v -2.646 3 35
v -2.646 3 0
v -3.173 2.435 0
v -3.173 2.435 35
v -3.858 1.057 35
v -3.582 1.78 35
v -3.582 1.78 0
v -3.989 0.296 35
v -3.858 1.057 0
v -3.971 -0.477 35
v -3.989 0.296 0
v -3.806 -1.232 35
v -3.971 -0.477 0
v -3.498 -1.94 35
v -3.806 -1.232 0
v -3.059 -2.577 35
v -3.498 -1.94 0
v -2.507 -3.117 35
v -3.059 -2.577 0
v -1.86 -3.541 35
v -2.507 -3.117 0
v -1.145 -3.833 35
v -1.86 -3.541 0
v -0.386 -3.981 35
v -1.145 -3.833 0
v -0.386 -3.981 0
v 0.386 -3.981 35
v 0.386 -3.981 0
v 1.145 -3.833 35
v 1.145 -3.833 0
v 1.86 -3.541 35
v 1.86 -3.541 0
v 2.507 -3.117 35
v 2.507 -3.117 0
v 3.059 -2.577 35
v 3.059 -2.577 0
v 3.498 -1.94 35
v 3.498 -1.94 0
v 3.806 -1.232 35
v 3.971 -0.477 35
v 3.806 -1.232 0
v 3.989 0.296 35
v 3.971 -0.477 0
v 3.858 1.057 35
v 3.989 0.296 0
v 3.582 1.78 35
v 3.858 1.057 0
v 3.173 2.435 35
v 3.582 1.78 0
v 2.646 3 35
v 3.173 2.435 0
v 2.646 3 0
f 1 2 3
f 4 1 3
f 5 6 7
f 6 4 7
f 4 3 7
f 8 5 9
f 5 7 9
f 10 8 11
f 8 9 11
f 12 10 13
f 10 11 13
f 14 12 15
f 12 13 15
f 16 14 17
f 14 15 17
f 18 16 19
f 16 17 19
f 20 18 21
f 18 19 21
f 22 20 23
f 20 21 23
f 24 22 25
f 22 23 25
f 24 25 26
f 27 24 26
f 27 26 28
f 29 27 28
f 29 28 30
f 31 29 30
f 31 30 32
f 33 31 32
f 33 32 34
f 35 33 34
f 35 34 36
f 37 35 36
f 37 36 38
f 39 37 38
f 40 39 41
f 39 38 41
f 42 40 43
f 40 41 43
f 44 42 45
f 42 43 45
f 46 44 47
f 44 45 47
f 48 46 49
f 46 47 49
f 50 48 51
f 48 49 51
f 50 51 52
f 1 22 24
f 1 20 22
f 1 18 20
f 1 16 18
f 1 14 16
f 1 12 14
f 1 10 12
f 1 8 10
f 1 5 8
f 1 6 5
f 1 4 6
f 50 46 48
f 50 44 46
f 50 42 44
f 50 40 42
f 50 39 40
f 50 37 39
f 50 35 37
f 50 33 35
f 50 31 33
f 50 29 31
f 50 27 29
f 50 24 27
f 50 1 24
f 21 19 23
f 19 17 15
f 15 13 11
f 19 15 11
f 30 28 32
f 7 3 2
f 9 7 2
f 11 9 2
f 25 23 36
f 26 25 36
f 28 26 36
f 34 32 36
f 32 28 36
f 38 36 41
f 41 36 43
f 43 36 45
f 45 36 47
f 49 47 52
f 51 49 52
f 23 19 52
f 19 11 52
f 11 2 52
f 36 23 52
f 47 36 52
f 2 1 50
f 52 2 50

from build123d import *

# Parameters (mm, degrees)
SKETCH2_R                      = 4
BOSS_EXTRUDE1_DEPTH            = 35
CUT_EXTRUDE1_REACH             = 37
CUT_EXTRUDE1_DIRECTION_2_DEPTH = 1


with BuildPart() as part:
    # Sketch2 → Boss-Extrude1 (new body)
    with BuildSketch(Plane.XY):
        Circle(SKETCH2_R)
    extrude(amount=BOSS_EXTRUDE1_DEPTH)

    # Sketch3 → Cut-Extrude1 (cut, up to next)
    with BuildSketch(Plane.XY.offset(35), mode=Mode.PRIVATE) as cut_extrude1_sk1:
        with BuildLine():
            Line((-2.645751311, 3), (2.645751311, 3))
            ThreePointArc((2.645751311, 3), (0, 4), (-2.645751311, 3))
        make_face()
    cut_extrude1_tool1 = extrude(cut_extrude1_sk1.sketch, amount=-CUT_EXTRUDE1_REACH, mode=Mode.PRIVATE) & part.part
    add(cut_extrude1_tool1.solids().sort_by_distance((0, 3.404621, 35))[0], mode=Mode.SUBTRACT)

    # Sketch3 → Cut-Extrude1 direction 2 (cut)
    with BuildSketch(Plane.XY.offset(35)):
        with BuildLine():
            Line((-2.645751311, 3), (2.645751311, 3))
            ThreePointArc((2.645751311, 3), (0, 4), (-2.645751311, 3))
        make_face()
    extrude(amount=CUT_EXTRUDE1_DIRECTION_2_DEPTH, mode=Mode.SUBTRACT)


solid = part.part
